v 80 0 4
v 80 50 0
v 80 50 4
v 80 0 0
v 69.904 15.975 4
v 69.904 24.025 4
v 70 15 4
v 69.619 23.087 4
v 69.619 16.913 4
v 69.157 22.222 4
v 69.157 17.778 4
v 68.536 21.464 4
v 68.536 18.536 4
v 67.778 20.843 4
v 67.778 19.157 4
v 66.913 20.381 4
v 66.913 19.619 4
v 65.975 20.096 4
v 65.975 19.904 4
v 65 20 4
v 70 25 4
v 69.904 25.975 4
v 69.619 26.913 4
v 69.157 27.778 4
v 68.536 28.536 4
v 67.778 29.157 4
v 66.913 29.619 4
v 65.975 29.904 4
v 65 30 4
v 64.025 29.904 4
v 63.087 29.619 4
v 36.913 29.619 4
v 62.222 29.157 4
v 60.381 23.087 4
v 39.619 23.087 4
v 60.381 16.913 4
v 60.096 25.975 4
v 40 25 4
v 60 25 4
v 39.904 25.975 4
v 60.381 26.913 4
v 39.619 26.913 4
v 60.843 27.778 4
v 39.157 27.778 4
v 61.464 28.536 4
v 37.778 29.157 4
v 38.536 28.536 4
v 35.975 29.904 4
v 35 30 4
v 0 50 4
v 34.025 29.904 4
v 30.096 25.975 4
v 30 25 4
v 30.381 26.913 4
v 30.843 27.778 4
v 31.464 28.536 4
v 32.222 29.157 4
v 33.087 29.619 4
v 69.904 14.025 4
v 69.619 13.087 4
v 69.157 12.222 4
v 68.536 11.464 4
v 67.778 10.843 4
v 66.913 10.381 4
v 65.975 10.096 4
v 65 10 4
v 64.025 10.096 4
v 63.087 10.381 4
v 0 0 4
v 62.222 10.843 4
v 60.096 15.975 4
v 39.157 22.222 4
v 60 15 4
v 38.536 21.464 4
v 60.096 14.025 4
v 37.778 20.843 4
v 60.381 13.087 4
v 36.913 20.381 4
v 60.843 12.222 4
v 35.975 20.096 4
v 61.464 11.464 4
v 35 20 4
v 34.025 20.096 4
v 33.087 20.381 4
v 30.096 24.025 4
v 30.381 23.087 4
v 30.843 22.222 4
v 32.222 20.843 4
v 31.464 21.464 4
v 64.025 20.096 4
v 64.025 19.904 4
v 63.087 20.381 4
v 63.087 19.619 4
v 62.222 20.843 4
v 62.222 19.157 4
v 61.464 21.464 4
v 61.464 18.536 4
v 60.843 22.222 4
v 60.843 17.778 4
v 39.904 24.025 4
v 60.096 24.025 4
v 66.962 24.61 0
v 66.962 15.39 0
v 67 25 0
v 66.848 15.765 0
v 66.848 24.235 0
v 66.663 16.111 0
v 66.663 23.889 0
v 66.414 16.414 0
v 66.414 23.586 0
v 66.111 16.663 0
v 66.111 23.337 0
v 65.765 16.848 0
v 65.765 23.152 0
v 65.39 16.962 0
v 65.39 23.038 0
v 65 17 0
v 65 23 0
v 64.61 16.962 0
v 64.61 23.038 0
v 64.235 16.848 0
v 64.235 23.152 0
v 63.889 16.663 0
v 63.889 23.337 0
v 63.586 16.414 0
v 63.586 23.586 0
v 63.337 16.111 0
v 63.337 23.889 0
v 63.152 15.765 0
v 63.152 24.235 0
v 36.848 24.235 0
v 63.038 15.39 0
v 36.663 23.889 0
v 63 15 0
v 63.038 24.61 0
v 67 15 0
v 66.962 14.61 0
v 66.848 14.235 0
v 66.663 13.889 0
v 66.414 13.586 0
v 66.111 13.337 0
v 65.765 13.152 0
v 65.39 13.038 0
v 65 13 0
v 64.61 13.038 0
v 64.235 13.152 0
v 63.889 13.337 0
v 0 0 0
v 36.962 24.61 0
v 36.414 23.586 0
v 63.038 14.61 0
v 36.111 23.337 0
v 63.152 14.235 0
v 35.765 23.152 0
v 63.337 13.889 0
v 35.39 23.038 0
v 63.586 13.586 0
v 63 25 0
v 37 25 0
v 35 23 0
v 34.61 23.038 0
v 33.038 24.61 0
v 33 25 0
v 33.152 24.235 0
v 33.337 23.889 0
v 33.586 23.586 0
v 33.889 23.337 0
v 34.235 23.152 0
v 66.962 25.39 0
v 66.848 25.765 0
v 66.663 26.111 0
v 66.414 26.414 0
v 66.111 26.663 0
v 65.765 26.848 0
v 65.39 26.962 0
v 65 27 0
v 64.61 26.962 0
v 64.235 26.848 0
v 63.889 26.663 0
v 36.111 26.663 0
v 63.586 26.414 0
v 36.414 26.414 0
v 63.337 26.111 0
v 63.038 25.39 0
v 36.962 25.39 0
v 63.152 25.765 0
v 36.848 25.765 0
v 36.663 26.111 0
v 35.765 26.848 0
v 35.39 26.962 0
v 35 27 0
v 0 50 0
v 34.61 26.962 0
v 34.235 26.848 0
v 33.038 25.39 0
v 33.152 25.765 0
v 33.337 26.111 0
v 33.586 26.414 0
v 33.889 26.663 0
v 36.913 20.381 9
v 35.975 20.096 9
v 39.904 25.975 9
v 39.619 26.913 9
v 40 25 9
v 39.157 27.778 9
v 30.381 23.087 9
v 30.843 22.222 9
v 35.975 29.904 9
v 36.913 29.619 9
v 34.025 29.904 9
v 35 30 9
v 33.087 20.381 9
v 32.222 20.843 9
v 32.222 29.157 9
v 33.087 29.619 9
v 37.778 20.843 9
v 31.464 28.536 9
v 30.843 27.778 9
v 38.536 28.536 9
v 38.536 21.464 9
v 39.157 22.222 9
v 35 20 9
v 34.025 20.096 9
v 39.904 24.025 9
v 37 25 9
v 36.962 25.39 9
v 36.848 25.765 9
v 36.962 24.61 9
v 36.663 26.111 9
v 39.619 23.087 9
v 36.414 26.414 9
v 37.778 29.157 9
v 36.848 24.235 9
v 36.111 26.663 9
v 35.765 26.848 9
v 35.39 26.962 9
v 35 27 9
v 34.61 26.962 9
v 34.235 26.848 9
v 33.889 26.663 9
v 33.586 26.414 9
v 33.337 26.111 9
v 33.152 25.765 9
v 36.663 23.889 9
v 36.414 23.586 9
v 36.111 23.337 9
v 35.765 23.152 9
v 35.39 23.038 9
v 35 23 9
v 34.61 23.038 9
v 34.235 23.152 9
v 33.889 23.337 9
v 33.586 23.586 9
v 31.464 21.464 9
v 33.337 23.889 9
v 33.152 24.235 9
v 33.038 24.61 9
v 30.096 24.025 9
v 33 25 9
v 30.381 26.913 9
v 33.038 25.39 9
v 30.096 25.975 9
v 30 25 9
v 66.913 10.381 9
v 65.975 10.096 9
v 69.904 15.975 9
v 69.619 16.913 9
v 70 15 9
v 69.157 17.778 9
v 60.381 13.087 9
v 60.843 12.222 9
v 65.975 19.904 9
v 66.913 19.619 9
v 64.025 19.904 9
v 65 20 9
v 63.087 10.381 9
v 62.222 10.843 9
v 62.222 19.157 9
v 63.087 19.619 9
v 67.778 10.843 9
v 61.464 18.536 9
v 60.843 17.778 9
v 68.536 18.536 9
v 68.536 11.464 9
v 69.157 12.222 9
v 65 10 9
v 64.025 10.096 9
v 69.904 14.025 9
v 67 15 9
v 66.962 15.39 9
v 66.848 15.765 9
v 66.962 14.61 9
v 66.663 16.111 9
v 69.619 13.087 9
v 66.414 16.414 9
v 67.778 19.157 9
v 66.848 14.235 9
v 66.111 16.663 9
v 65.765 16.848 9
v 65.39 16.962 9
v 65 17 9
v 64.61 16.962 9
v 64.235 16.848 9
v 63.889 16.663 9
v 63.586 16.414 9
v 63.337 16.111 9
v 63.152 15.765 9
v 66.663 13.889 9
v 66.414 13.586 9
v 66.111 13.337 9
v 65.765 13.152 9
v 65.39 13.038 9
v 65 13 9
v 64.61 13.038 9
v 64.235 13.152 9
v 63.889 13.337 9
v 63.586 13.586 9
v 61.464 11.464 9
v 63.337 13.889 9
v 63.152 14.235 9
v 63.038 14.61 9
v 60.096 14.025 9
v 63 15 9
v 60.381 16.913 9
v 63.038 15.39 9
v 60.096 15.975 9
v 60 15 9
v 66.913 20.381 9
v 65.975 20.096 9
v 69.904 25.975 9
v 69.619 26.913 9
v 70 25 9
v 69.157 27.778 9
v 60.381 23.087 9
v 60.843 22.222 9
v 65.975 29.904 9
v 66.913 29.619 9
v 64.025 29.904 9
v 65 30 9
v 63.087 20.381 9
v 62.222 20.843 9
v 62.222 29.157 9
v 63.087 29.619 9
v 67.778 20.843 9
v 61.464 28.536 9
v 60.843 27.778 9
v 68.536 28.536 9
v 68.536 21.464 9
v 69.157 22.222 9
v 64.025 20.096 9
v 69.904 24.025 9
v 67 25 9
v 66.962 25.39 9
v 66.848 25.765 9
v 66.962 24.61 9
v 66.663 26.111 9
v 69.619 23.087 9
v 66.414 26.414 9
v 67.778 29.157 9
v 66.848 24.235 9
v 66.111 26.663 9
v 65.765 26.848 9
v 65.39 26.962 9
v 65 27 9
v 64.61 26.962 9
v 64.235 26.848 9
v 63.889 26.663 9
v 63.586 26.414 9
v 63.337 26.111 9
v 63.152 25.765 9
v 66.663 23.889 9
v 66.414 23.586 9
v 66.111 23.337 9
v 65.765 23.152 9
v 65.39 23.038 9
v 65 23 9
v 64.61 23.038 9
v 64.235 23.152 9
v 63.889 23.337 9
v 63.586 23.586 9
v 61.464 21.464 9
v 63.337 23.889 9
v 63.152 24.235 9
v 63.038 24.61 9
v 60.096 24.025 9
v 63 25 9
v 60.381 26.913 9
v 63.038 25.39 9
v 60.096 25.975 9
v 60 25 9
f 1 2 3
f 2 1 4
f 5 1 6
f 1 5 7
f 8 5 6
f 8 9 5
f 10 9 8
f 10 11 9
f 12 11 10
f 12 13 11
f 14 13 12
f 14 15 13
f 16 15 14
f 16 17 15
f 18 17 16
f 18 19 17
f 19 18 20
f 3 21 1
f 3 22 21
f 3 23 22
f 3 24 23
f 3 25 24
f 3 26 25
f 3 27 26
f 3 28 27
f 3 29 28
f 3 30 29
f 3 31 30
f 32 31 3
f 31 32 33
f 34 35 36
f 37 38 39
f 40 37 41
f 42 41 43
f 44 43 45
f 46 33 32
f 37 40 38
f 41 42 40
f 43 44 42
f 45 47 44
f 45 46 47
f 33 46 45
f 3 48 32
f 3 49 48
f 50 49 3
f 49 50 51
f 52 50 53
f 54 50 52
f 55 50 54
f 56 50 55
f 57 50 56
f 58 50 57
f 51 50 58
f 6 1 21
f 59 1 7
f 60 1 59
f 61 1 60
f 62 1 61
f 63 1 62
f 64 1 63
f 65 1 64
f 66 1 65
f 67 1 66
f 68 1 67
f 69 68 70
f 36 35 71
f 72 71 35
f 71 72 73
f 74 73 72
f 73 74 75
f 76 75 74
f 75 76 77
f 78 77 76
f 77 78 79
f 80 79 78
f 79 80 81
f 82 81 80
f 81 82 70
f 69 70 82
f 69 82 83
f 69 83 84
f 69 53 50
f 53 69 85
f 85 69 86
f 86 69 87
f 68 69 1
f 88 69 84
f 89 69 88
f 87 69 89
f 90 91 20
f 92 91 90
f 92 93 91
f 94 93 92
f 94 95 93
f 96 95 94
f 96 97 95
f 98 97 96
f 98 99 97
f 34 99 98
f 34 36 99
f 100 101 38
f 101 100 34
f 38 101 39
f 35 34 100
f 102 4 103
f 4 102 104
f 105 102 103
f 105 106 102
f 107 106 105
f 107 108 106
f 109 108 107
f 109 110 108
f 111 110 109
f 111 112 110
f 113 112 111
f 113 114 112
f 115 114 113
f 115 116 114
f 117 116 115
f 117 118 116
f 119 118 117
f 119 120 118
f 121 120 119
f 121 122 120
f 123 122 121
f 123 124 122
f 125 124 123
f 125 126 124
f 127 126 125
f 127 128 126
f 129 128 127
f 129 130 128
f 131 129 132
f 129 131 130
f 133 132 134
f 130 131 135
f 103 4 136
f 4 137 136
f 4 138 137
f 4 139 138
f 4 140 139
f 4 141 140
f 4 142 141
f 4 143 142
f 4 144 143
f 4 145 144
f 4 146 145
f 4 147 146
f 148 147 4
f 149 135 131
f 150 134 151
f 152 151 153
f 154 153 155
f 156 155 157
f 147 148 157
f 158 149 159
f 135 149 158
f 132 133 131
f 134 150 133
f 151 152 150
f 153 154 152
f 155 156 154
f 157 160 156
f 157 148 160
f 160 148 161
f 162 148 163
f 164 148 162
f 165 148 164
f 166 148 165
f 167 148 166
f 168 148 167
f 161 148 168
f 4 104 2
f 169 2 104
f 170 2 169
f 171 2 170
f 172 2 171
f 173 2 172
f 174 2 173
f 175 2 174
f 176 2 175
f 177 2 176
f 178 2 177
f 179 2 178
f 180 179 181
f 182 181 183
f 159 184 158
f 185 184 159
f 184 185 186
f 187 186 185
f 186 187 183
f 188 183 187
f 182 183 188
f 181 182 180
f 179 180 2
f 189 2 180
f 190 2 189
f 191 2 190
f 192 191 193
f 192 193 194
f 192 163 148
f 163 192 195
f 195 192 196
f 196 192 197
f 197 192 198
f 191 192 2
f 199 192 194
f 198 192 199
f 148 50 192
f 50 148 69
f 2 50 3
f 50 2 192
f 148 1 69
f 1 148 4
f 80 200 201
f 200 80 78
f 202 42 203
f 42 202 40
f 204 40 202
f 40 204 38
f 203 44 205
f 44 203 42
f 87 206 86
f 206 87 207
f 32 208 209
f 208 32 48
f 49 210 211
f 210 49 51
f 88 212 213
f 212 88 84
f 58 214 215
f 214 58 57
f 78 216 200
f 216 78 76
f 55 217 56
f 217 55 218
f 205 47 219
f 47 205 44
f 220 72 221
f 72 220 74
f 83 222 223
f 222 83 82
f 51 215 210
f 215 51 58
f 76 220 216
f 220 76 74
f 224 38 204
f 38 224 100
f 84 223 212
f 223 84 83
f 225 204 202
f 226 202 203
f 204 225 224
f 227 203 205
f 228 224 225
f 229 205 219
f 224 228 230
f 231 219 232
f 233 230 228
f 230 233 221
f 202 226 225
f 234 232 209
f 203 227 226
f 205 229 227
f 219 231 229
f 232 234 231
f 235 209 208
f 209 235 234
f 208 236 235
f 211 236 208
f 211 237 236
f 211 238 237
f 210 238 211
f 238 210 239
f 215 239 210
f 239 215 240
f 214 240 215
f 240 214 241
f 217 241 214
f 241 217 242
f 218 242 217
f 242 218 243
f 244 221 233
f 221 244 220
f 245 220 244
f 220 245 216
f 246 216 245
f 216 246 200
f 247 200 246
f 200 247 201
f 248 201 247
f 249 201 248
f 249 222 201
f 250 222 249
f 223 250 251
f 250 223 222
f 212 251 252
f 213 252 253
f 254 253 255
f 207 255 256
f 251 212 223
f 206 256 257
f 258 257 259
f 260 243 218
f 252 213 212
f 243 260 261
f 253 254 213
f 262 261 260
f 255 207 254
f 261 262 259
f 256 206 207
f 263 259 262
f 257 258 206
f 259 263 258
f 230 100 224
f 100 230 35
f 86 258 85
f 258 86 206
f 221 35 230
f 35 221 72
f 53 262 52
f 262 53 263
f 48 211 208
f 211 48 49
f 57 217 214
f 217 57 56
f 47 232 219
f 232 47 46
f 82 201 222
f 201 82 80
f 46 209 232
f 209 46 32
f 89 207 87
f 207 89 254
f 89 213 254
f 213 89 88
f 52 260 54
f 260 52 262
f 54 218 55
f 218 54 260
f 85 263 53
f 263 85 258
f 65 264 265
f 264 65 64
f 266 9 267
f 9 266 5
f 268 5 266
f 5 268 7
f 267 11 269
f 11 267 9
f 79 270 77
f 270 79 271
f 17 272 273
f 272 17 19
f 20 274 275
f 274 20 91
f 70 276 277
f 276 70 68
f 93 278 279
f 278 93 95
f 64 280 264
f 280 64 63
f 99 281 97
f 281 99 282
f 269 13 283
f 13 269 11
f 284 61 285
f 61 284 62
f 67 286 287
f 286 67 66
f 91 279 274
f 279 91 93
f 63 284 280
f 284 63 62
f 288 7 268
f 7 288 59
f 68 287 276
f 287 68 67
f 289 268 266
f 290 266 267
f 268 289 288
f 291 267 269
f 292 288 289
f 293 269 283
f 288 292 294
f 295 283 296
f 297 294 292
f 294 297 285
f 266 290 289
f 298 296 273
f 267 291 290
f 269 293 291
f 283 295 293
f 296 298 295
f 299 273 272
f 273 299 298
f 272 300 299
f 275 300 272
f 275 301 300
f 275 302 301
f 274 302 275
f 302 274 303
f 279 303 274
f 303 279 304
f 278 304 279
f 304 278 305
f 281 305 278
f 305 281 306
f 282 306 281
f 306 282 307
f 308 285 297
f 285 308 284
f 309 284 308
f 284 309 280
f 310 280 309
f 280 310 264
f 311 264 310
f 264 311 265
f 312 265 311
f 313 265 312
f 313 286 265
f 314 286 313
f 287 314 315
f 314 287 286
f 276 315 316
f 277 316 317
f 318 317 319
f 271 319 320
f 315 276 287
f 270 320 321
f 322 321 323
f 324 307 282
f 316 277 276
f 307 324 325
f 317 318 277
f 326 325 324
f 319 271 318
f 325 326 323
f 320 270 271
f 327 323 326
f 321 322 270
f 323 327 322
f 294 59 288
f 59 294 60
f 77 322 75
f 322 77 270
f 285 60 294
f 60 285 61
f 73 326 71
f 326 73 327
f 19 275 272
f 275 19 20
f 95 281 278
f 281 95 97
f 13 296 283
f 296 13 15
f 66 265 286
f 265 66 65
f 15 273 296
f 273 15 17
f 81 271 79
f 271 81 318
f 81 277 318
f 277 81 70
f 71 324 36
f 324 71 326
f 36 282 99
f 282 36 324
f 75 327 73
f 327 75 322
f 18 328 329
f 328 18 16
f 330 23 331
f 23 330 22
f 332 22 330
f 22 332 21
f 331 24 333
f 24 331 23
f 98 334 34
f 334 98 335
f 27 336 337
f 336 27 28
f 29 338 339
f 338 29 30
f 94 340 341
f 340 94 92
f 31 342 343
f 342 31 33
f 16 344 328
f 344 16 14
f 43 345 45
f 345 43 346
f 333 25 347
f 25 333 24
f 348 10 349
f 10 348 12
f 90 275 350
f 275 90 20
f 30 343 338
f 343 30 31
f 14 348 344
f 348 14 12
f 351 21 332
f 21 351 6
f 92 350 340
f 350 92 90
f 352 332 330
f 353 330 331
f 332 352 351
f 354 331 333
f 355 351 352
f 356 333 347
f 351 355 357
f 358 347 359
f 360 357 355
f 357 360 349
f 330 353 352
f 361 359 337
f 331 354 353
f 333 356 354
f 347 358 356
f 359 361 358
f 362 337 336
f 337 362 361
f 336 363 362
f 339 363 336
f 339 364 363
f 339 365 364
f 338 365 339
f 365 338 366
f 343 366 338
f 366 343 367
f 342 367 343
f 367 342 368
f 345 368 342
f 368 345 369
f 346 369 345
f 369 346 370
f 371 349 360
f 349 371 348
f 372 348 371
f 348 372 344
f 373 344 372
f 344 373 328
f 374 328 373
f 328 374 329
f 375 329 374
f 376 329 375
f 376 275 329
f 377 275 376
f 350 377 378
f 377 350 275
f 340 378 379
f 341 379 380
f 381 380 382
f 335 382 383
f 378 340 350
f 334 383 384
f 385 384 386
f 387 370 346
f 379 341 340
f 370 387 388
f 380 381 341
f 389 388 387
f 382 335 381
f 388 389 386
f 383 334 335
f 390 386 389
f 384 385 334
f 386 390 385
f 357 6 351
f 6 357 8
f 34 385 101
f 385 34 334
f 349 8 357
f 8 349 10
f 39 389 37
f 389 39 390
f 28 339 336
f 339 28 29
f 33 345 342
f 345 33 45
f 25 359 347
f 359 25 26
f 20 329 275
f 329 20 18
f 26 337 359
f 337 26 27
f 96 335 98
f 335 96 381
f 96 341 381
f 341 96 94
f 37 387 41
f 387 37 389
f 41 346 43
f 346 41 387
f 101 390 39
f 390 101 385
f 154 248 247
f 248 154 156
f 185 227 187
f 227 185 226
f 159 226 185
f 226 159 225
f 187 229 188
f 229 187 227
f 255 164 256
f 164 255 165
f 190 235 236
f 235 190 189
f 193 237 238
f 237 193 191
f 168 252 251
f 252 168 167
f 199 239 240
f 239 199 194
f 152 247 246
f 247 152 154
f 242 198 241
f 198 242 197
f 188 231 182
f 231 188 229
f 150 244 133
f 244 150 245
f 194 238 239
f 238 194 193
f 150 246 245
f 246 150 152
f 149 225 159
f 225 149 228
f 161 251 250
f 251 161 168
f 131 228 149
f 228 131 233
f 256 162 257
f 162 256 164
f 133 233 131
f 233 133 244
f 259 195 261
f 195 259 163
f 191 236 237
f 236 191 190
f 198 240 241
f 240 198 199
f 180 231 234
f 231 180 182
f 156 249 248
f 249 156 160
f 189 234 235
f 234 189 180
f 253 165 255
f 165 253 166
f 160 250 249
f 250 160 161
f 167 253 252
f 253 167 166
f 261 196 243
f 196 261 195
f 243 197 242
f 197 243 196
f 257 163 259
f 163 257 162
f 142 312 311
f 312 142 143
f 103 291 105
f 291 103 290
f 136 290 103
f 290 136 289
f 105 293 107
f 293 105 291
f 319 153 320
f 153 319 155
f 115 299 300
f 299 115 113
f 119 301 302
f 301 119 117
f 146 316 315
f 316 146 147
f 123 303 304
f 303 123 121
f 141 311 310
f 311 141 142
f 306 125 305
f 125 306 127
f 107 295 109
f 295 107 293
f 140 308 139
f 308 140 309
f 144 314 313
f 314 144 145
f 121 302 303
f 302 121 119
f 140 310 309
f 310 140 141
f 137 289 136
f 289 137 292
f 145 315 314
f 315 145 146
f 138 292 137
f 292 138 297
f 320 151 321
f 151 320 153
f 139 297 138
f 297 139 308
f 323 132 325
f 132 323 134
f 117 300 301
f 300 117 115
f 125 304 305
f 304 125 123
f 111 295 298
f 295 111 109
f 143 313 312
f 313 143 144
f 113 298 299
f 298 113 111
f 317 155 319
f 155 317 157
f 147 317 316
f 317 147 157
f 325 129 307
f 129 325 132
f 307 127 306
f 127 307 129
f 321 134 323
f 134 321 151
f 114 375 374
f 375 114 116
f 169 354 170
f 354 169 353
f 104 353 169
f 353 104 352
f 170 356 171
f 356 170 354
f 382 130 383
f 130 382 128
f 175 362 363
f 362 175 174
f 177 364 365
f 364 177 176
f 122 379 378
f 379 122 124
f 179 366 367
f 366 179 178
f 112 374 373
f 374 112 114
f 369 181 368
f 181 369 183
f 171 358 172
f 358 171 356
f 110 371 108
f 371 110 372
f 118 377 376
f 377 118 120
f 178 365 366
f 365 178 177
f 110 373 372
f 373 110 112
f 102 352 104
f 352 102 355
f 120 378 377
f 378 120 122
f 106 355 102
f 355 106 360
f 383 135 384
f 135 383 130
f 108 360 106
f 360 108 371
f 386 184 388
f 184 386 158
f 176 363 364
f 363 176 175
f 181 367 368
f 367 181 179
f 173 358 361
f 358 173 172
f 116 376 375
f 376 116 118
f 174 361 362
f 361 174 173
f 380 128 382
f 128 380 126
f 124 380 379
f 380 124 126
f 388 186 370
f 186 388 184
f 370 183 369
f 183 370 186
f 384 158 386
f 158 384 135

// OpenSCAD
$fn = 32;

// ----------------------------------------------------------------------
// Boss field: plate with bosses at given coordinates
// ----------------------------------------------------------------------

// --- parameters (mm) ---
plate_l = 80;             // plate length, X
plate_w = 50;             // plate width, Y
plate_t = 4;              // plate thickness, Z
boss_d = 10;              // boss diameter
boss_h = 5;               // boss height above the plate
bore_d = 4;               // boss bore

total_h = plate_t + boss_h;  // overall height

difference() {
  union() {
    cube([plate_l, plate_w, plate_t]);
    translate([35, 25, plate_t]) cylinder(h = boss_h, d = boss_d);
    translate([65, 15, plate_t]) cylinder(h = boss_h, d = boss_d);
    translate([65, 25, plate_t]) cylinder(h = boss_h, d = boss_d);
  }
  translate([35, 25, -1]) cylinder(h = total_h + 2, d = bore_d);
  translate([65, 15, -1]) cylinder(h = total_h + 2, d = bore_d);
  translate([65, 25, -1]) cylinder(h = total_h + 2, d = bore_d);
}
